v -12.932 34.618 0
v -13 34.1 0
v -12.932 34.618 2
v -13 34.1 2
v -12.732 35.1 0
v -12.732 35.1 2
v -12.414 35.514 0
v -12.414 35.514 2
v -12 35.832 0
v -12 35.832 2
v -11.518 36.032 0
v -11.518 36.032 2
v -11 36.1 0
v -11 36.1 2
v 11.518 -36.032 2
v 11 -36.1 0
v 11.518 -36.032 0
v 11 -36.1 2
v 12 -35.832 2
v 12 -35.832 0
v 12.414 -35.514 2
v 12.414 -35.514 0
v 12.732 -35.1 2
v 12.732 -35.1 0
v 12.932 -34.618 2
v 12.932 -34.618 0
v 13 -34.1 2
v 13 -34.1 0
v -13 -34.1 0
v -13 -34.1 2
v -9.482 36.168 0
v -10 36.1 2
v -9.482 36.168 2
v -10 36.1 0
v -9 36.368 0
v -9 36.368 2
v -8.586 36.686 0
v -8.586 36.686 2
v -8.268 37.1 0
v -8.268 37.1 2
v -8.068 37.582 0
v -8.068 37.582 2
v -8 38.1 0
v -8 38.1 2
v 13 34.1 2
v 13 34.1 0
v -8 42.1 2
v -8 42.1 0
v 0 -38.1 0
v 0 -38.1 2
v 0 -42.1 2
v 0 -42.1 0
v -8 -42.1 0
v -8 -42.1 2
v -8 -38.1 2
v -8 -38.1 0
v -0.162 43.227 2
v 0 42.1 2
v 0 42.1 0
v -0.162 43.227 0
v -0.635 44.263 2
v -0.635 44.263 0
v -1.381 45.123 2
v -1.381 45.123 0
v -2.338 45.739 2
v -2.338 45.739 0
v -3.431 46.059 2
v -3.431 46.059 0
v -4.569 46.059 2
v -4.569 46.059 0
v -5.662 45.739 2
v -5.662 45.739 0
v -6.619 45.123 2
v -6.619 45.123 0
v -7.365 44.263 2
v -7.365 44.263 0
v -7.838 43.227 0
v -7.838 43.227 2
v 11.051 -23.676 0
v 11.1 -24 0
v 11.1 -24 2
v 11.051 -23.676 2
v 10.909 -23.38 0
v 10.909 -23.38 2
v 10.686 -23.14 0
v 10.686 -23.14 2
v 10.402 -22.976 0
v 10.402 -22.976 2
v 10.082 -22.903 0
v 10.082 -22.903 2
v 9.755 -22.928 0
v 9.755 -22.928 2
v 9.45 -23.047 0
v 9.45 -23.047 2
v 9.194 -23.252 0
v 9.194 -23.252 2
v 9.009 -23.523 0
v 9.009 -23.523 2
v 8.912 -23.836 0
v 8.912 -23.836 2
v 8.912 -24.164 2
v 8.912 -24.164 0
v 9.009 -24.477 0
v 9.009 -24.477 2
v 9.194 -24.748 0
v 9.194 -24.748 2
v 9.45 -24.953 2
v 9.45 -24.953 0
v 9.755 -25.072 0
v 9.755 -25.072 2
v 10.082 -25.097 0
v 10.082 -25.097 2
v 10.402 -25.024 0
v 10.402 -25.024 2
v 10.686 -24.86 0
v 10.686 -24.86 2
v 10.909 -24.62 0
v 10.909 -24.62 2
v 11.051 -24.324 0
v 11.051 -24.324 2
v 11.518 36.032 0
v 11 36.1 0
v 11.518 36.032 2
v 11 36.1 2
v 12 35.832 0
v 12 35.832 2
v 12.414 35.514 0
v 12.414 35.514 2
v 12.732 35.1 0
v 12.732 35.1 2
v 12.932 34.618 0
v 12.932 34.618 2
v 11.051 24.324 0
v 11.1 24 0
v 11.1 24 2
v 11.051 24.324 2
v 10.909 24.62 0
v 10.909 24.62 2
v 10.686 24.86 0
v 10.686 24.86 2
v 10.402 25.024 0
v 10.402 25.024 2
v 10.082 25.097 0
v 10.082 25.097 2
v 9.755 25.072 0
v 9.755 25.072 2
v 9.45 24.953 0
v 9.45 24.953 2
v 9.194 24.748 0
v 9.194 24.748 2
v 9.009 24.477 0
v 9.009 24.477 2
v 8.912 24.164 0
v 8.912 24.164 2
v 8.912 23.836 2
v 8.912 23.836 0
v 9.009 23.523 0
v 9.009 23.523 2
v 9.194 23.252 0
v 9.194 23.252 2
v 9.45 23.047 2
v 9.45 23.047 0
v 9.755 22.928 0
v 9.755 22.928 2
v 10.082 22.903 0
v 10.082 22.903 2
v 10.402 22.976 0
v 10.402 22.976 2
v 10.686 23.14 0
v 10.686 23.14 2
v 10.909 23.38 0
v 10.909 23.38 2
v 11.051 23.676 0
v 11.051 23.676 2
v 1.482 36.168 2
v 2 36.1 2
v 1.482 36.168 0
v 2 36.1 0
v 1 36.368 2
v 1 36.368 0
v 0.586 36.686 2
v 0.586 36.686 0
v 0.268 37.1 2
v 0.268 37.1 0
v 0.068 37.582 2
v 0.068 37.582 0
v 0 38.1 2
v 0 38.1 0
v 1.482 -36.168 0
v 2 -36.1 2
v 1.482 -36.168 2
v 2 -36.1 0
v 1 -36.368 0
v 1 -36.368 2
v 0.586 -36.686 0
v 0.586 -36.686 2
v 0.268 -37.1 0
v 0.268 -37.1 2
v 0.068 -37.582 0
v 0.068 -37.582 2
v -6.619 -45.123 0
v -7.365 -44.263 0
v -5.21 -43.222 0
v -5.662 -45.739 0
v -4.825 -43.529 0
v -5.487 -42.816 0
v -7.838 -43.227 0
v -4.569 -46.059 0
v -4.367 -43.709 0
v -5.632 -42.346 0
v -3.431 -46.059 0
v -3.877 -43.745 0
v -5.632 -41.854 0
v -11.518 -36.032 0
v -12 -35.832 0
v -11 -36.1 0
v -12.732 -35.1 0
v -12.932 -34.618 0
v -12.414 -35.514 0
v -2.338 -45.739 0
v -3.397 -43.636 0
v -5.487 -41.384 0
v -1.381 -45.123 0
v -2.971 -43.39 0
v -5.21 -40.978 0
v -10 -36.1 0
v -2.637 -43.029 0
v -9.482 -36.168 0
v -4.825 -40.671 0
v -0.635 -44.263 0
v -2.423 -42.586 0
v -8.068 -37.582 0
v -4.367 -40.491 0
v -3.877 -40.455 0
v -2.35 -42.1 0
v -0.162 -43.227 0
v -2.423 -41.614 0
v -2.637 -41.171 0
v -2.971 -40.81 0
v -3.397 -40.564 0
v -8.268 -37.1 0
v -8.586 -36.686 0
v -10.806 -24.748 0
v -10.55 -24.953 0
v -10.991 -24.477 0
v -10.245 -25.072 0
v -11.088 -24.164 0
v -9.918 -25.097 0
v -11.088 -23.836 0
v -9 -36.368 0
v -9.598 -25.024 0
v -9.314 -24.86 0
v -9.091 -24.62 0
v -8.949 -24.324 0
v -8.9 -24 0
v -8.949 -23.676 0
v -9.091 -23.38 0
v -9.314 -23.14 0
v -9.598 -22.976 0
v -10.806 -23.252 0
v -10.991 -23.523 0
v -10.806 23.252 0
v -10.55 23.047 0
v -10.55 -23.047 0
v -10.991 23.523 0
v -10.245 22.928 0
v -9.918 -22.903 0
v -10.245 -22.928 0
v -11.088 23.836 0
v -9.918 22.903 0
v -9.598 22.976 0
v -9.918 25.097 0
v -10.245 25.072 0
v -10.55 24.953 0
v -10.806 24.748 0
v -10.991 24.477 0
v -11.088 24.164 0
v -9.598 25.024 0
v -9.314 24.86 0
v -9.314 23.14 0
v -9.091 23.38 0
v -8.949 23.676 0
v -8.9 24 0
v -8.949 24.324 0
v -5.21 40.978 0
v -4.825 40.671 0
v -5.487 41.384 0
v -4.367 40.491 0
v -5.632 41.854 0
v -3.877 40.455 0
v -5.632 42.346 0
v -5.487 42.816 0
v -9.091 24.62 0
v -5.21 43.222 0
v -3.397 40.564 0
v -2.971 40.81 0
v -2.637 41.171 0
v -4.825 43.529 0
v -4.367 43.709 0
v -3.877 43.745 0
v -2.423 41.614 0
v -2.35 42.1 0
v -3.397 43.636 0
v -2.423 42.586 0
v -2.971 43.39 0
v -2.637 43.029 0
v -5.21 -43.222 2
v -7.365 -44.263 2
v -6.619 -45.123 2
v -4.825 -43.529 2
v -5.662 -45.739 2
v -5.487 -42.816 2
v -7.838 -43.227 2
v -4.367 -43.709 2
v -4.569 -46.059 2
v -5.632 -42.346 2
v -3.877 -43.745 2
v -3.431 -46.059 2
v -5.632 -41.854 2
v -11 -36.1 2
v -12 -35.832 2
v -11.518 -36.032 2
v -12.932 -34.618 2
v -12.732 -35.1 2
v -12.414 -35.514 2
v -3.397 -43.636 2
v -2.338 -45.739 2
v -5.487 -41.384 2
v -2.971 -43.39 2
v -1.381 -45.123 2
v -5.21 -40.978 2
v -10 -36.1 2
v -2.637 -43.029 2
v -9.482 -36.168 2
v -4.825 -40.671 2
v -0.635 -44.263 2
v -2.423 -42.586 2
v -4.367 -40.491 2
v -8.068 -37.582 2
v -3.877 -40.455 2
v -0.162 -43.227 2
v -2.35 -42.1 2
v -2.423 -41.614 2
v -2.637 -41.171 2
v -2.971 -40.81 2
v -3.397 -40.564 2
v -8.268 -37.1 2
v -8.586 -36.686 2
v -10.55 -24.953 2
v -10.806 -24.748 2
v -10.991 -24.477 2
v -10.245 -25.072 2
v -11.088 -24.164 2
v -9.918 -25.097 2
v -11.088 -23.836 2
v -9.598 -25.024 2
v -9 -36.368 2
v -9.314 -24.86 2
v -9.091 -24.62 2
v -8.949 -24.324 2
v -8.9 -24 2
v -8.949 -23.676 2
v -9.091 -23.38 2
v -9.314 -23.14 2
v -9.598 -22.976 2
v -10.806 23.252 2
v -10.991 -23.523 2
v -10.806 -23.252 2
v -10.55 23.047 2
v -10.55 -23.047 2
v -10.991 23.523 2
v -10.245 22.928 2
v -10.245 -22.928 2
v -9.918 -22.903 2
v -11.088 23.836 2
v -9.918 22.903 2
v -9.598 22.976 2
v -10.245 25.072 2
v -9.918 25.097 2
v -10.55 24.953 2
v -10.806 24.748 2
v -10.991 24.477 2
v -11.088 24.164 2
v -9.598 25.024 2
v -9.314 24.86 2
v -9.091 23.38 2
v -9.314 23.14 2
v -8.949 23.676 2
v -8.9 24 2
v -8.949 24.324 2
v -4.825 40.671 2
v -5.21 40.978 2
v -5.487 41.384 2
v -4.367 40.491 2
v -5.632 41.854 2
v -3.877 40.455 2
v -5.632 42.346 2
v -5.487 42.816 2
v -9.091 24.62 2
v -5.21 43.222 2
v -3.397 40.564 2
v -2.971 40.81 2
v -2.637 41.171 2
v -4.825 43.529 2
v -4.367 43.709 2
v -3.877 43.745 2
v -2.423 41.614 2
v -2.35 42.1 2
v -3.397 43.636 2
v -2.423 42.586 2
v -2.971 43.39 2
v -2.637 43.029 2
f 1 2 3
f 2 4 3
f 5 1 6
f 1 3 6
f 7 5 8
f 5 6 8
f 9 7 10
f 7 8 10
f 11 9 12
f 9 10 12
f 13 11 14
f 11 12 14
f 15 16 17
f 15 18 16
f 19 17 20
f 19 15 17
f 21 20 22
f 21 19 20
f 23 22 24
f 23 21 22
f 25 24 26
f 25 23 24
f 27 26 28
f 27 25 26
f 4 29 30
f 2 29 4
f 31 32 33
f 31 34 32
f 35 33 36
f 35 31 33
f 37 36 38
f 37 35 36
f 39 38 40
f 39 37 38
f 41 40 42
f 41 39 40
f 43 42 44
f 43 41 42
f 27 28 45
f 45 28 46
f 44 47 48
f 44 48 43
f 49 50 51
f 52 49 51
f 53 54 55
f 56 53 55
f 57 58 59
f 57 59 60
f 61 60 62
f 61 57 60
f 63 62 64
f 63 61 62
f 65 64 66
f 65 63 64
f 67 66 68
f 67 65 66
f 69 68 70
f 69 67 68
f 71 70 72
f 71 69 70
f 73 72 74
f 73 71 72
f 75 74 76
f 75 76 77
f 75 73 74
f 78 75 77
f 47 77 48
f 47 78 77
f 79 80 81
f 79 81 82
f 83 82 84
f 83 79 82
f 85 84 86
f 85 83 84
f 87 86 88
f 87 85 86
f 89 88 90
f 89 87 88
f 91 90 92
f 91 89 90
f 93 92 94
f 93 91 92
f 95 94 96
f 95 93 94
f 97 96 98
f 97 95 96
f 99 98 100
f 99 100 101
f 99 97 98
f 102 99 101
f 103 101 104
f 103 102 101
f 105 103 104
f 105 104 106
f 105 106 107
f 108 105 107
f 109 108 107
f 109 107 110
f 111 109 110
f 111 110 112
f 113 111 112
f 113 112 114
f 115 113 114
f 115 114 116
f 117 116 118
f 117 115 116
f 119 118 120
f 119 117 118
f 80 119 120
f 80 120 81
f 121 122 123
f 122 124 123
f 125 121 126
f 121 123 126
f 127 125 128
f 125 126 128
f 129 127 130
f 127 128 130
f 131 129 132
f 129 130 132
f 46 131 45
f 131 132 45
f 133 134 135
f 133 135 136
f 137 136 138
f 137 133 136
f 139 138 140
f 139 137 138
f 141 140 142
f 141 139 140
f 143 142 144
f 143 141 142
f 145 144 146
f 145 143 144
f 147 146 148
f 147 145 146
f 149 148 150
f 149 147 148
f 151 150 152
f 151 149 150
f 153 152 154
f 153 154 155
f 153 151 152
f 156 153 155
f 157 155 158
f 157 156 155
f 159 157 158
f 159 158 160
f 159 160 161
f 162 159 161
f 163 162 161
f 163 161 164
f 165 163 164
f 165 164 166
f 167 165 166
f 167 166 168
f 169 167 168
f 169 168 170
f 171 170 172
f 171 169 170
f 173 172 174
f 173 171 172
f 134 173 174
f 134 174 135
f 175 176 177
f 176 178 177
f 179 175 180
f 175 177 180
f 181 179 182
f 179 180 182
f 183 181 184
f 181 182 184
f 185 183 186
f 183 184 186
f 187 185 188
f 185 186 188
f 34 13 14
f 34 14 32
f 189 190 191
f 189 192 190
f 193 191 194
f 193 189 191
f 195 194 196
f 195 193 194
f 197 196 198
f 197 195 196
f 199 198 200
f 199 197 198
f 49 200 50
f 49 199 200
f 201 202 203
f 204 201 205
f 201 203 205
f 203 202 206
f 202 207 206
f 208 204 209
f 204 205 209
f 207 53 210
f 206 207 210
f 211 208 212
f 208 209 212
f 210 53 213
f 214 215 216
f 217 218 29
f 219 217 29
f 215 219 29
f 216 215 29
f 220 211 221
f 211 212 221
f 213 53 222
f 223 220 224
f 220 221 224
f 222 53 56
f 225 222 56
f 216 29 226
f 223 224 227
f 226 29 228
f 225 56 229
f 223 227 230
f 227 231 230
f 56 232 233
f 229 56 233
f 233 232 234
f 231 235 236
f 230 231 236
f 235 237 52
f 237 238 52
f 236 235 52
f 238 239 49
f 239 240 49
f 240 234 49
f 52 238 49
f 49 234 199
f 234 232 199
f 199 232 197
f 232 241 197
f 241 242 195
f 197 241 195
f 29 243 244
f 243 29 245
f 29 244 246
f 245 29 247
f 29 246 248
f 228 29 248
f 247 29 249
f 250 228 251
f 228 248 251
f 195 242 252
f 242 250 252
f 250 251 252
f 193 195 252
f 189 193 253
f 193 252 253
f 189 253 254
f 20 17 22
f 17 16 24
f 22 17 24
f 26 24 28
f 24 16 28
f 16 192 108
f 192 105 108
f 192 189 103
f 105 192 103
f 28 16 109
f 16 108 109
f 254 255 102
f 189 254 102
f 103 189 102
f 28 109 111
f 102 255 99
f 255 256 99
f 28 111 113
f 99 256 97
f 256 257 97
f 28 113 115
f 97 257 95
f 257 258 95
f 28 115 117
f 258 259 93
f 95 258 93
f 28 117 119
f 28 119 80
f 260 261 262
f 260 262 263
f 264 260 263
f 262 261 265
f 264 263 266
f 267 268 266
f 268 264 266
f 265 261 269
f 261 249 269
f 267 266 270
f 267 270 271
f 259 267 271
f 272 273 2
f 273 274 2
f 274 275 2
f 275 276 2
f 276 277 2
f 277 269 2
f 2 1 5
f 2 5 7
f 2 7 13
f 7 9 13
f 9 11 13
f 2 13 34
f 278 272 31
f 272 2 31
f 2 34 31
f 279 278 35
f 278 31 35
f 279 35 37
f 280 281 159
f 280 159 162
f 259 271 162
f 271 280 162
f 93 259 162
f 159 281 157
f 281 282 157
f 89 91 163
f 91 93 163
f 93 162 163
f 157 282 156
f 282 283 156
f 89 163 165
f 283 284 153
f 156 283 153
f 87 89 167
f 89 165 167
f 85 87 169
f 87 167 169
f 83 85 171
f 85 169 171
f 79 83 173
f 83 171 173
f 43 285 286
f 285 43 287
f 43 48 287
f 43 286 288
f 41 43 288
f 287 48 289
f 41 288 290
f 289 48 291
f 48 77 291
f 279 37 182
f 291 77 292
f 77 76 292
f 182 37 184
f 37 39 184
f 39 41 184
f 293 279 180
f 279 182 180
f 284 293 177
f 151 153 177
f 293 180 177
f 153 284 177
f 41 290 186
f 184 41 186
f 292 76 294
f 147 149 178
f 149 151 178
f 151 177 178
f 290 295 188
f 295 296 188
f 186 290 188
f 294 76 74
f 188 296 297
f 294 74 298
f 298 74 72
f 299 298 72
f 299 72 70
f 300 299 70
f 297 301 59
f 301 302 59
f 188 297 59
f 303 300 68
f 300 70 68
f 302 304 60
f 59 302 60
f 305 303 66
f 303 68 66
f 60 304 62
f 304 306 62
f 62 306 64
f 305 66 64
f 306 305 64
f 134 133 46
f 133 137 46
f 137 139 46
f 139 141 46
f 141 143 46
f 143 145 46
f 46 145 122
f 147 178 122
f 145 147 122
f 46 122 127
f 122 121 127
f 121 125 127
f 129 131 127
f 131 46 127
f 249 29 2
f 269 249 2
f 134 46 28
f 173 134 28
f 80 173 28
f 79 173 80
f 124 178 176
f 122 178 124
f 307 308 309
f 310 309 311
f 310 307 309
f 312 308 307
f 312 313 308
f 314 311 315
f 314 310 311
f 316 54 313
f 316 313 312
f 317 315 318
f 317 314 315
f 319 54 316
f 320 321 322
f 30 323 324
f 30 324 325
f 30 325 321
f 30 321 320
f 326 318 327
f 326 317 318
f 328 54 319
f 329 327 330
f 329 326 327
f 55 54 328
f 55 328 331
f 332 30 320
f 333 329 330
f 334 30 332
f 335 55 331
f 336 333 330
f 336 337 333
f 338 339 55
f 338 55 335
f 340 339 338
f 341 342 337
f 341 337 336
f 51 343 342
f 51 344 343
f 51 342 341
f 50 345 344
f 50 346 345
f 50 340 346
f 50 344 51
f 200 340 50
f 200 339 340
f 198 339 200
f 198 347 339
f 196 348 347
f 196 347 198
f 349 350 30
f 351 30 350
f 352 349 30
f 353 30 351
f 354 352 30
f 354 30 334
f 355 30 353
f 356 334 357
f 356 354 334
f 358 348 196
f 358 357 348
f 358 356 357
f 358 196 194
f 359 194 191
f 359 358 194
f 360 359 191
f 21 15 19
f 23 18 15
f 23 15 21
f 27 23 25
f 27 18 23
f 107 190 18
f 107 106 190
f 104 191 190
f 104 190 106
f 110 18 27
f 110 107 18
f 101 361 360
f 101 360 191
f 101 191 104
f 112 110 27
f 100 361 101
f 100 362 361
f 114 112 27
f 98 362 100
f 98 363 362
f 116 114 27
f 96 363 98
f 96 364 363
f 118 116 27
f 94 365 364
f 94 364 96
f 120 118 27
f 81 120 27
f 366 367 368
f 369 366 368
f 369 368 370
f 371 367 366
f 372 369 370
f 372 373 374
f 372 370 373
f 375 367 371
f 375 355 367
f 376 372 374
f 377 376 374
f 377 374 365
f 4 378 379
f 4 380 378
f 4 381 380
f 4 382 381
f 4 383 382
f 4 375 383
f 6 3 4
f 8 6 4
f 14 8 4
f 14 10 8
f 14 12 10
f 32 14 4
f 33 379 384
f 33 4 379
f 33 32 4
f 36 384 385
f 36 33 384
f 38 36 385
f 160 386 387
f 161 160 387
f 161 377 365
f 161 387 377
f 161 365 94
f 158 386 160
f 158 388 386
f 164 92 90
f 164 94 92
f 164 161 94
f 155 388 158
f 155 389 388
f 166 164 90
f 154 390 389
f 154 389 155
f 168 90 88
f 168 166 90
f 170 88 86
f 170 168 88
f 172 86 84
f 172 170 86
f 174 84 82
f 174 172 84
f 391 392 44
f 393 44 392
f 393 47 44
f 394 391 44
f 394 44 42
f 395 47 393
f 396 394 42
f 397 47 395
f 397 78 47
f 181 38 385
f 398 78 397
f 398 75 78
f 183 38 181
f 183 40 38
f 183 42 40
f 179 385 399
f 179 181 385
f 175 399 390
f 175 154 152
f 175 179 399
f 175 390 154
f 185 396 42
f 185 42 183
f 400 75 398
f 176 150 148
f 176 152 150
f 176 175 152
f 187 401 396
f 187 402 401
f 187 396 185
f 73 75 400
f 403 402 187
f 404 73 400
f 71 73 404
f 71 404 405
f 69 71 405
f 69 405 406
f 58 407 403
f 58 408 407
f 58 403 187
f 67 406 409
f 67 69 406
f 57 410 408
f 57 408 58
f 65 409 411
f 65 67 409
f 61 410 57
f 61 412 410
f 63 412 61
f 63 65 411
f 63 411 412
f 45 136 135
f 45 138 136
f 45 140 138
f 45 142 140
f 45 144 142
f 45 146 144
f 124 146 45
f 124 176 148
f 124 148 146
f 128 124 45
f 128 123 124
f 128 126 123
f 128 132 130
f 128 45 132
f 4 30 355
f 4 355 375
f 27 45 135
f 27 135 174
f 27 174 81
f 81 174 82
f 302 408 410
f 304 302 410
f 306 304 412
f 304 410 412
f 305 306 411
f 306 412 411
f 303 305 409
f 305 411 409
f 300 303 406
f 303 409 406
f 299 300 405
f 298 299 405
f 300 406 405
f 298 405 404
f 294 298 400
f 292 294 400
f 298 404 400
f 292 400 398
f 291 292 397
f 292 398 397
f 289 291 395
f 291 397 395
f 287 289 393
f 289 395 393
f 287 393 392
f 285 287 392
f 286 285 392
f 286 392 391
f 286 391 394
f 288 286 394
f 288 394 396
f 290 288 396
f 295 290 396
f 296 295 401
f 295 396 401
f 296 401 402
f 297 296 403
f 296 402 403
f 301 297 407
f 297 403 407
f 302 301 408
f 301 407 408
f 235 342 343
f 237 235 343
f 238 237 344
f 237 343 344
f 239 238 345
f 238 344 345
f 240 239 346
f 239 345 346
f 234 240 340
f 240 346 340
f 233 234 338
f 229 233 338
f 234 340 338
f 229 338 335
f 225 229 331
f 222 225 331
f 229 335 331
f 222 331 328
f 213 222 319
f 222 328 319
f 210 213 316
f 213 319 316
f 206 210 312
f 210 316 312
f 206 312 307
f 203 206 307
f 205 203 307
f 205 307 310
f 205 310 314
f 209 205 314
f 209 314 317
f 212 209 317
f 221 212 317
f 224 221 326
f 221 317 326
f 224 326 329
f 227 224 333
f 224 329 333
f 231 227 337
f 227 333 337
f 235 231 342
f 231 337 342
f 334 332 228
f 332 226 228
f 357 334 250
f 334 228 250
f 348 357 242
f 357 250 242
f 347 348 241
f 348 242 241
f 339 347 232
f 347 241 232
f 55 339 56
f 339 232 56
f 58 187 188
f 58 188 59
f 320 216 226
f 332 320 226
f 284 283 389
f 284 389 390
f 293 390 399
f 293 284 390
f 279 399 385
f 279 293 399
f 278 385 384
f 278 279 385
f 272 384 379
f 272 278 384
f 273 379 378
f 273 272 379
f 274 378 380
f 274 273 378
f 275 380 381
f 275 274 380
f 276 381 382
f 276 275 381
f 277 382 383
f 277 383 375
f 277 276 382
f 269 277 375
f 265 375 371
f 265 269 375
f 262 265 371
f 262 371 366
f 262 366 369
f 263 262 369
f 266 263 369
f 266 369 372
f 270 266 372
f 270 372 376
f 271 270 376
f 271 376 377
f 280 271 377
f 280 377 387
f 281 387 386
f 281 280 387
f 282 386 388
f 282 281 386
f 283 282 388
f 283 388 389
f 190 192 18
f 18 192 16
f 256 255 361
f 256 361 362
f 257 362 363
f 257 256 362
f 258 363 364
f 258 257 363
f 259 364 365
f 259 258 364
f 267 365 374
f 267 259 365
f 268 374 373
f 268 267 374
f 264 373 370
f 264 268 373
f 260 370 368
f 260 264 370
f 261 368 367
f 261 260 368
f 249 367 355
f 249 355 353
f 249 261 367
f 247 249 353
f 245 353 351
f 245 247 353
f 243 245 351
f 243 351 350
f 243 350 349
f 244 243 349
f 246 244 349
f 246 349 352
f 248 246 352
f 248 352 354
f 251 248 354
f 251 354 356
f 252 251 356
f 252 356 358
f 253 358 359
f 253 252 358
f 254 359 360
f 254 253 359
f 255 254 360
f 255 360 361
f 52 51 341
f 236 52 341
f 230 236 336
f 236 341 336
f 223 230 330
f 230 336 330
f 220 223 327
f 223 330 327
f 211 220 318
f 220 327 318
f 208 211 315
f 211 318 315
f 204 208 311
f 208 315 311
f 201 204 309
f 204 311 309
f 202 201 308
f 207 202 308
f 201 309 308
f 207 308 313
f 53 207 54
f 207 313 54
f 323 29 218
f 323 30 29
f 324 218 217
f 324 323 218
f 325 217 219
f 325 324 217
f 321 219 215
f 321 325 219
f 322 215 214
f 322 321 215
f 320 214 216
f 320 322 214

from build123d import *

# Parameters (mm, degrees)
SKETCH_1_W      = 26
SKETCH_1_H      = 72.2
SKETCH_1_R      = 1.1
EXTRUDE_1_DEPTH = 2
SKETCH_2_R      = 1.65
EXTRUDE_2_DEPTH = 2
FILLET_1_R      = 2


with BuildPart() as part:
    # 草图1 → 凸台-拉伸1 (new body)
    with BuildSketch(Plane.XY):
        Rectangle(SKETCH_1_W, SKETCH_1_H)
        with Locations((-10, 24)):
            Circle(SKETCH_1_R, mode=Mode.SUBTRACT)
        with Locations((10, 24)):
            Circle(SKETCH_1_R, mode=Mode.SUBTRACT)
        with Locations((-10, -24)):
            Circle(SKETCH_1_R, mode=Mode.SUBTRACT)
        with Locations((10, -24)):
            Circle(SKETCH_1_R, mode=Mode.SUBTRACT)
    extrude(amount=EXTRUDE_1_DEPTH)

    # 草图2 → 凸台-拉伸2 (add)
    # profile 1 of 2: a face of its own
    with BuildSketch(Plane.XY.offset(2)):
        with BuildLine():
            Line((-8, 42.1), (-8, 36.1))
            Line((-8, 36.1), (0, 36.1))
            Line((0, 36.1), (0, 42.1))
            ThreePointArc((0, 42.1), (-4, 46.1), (-8, 42.1))
        make_face()
        with Locations((-4, 42.1)):
            Circle(SKETCH_2_R, mode=Mode.SUBTRACT)
    # profile 2 of 2: a face of its own
    with BuildSketch(Plane.XY.offset(2)):
        with BuildLine():
            Line((-8, -42.1), (-8, -36.1))
            Line((-8, -36.1), (0, -36.1))
            Line((0, -36.1), (0, -42.1))
            ThreePointArc((0, -42.1), (-4, -46.1), (-8, -42.1))
        make_face()
        with Locations((-4, -42.1)):
            Circle(SKETCH_2_R, mode=Mode.SUBTRACT)
    extrude(amount=-EXTRUDE_2_DEPTH)

    # 圆角1
    fillet_1_edges = [part.edges().sort_by_distance(p)[0] for p in [
        (-8, 36.1, 1),
        (0, 36.1, 1),
        (0, -36.1, 1),
        (-8, -36.1, 1),
        (-13, 36.1, 1),
        (13, 36.1, 1),
        (13, -36.1, 1),
        (-13, -36.1, 1),
    ]]
    fillet(fillet_1_edges, radius=FILLET_1_R)


solid = part.part
